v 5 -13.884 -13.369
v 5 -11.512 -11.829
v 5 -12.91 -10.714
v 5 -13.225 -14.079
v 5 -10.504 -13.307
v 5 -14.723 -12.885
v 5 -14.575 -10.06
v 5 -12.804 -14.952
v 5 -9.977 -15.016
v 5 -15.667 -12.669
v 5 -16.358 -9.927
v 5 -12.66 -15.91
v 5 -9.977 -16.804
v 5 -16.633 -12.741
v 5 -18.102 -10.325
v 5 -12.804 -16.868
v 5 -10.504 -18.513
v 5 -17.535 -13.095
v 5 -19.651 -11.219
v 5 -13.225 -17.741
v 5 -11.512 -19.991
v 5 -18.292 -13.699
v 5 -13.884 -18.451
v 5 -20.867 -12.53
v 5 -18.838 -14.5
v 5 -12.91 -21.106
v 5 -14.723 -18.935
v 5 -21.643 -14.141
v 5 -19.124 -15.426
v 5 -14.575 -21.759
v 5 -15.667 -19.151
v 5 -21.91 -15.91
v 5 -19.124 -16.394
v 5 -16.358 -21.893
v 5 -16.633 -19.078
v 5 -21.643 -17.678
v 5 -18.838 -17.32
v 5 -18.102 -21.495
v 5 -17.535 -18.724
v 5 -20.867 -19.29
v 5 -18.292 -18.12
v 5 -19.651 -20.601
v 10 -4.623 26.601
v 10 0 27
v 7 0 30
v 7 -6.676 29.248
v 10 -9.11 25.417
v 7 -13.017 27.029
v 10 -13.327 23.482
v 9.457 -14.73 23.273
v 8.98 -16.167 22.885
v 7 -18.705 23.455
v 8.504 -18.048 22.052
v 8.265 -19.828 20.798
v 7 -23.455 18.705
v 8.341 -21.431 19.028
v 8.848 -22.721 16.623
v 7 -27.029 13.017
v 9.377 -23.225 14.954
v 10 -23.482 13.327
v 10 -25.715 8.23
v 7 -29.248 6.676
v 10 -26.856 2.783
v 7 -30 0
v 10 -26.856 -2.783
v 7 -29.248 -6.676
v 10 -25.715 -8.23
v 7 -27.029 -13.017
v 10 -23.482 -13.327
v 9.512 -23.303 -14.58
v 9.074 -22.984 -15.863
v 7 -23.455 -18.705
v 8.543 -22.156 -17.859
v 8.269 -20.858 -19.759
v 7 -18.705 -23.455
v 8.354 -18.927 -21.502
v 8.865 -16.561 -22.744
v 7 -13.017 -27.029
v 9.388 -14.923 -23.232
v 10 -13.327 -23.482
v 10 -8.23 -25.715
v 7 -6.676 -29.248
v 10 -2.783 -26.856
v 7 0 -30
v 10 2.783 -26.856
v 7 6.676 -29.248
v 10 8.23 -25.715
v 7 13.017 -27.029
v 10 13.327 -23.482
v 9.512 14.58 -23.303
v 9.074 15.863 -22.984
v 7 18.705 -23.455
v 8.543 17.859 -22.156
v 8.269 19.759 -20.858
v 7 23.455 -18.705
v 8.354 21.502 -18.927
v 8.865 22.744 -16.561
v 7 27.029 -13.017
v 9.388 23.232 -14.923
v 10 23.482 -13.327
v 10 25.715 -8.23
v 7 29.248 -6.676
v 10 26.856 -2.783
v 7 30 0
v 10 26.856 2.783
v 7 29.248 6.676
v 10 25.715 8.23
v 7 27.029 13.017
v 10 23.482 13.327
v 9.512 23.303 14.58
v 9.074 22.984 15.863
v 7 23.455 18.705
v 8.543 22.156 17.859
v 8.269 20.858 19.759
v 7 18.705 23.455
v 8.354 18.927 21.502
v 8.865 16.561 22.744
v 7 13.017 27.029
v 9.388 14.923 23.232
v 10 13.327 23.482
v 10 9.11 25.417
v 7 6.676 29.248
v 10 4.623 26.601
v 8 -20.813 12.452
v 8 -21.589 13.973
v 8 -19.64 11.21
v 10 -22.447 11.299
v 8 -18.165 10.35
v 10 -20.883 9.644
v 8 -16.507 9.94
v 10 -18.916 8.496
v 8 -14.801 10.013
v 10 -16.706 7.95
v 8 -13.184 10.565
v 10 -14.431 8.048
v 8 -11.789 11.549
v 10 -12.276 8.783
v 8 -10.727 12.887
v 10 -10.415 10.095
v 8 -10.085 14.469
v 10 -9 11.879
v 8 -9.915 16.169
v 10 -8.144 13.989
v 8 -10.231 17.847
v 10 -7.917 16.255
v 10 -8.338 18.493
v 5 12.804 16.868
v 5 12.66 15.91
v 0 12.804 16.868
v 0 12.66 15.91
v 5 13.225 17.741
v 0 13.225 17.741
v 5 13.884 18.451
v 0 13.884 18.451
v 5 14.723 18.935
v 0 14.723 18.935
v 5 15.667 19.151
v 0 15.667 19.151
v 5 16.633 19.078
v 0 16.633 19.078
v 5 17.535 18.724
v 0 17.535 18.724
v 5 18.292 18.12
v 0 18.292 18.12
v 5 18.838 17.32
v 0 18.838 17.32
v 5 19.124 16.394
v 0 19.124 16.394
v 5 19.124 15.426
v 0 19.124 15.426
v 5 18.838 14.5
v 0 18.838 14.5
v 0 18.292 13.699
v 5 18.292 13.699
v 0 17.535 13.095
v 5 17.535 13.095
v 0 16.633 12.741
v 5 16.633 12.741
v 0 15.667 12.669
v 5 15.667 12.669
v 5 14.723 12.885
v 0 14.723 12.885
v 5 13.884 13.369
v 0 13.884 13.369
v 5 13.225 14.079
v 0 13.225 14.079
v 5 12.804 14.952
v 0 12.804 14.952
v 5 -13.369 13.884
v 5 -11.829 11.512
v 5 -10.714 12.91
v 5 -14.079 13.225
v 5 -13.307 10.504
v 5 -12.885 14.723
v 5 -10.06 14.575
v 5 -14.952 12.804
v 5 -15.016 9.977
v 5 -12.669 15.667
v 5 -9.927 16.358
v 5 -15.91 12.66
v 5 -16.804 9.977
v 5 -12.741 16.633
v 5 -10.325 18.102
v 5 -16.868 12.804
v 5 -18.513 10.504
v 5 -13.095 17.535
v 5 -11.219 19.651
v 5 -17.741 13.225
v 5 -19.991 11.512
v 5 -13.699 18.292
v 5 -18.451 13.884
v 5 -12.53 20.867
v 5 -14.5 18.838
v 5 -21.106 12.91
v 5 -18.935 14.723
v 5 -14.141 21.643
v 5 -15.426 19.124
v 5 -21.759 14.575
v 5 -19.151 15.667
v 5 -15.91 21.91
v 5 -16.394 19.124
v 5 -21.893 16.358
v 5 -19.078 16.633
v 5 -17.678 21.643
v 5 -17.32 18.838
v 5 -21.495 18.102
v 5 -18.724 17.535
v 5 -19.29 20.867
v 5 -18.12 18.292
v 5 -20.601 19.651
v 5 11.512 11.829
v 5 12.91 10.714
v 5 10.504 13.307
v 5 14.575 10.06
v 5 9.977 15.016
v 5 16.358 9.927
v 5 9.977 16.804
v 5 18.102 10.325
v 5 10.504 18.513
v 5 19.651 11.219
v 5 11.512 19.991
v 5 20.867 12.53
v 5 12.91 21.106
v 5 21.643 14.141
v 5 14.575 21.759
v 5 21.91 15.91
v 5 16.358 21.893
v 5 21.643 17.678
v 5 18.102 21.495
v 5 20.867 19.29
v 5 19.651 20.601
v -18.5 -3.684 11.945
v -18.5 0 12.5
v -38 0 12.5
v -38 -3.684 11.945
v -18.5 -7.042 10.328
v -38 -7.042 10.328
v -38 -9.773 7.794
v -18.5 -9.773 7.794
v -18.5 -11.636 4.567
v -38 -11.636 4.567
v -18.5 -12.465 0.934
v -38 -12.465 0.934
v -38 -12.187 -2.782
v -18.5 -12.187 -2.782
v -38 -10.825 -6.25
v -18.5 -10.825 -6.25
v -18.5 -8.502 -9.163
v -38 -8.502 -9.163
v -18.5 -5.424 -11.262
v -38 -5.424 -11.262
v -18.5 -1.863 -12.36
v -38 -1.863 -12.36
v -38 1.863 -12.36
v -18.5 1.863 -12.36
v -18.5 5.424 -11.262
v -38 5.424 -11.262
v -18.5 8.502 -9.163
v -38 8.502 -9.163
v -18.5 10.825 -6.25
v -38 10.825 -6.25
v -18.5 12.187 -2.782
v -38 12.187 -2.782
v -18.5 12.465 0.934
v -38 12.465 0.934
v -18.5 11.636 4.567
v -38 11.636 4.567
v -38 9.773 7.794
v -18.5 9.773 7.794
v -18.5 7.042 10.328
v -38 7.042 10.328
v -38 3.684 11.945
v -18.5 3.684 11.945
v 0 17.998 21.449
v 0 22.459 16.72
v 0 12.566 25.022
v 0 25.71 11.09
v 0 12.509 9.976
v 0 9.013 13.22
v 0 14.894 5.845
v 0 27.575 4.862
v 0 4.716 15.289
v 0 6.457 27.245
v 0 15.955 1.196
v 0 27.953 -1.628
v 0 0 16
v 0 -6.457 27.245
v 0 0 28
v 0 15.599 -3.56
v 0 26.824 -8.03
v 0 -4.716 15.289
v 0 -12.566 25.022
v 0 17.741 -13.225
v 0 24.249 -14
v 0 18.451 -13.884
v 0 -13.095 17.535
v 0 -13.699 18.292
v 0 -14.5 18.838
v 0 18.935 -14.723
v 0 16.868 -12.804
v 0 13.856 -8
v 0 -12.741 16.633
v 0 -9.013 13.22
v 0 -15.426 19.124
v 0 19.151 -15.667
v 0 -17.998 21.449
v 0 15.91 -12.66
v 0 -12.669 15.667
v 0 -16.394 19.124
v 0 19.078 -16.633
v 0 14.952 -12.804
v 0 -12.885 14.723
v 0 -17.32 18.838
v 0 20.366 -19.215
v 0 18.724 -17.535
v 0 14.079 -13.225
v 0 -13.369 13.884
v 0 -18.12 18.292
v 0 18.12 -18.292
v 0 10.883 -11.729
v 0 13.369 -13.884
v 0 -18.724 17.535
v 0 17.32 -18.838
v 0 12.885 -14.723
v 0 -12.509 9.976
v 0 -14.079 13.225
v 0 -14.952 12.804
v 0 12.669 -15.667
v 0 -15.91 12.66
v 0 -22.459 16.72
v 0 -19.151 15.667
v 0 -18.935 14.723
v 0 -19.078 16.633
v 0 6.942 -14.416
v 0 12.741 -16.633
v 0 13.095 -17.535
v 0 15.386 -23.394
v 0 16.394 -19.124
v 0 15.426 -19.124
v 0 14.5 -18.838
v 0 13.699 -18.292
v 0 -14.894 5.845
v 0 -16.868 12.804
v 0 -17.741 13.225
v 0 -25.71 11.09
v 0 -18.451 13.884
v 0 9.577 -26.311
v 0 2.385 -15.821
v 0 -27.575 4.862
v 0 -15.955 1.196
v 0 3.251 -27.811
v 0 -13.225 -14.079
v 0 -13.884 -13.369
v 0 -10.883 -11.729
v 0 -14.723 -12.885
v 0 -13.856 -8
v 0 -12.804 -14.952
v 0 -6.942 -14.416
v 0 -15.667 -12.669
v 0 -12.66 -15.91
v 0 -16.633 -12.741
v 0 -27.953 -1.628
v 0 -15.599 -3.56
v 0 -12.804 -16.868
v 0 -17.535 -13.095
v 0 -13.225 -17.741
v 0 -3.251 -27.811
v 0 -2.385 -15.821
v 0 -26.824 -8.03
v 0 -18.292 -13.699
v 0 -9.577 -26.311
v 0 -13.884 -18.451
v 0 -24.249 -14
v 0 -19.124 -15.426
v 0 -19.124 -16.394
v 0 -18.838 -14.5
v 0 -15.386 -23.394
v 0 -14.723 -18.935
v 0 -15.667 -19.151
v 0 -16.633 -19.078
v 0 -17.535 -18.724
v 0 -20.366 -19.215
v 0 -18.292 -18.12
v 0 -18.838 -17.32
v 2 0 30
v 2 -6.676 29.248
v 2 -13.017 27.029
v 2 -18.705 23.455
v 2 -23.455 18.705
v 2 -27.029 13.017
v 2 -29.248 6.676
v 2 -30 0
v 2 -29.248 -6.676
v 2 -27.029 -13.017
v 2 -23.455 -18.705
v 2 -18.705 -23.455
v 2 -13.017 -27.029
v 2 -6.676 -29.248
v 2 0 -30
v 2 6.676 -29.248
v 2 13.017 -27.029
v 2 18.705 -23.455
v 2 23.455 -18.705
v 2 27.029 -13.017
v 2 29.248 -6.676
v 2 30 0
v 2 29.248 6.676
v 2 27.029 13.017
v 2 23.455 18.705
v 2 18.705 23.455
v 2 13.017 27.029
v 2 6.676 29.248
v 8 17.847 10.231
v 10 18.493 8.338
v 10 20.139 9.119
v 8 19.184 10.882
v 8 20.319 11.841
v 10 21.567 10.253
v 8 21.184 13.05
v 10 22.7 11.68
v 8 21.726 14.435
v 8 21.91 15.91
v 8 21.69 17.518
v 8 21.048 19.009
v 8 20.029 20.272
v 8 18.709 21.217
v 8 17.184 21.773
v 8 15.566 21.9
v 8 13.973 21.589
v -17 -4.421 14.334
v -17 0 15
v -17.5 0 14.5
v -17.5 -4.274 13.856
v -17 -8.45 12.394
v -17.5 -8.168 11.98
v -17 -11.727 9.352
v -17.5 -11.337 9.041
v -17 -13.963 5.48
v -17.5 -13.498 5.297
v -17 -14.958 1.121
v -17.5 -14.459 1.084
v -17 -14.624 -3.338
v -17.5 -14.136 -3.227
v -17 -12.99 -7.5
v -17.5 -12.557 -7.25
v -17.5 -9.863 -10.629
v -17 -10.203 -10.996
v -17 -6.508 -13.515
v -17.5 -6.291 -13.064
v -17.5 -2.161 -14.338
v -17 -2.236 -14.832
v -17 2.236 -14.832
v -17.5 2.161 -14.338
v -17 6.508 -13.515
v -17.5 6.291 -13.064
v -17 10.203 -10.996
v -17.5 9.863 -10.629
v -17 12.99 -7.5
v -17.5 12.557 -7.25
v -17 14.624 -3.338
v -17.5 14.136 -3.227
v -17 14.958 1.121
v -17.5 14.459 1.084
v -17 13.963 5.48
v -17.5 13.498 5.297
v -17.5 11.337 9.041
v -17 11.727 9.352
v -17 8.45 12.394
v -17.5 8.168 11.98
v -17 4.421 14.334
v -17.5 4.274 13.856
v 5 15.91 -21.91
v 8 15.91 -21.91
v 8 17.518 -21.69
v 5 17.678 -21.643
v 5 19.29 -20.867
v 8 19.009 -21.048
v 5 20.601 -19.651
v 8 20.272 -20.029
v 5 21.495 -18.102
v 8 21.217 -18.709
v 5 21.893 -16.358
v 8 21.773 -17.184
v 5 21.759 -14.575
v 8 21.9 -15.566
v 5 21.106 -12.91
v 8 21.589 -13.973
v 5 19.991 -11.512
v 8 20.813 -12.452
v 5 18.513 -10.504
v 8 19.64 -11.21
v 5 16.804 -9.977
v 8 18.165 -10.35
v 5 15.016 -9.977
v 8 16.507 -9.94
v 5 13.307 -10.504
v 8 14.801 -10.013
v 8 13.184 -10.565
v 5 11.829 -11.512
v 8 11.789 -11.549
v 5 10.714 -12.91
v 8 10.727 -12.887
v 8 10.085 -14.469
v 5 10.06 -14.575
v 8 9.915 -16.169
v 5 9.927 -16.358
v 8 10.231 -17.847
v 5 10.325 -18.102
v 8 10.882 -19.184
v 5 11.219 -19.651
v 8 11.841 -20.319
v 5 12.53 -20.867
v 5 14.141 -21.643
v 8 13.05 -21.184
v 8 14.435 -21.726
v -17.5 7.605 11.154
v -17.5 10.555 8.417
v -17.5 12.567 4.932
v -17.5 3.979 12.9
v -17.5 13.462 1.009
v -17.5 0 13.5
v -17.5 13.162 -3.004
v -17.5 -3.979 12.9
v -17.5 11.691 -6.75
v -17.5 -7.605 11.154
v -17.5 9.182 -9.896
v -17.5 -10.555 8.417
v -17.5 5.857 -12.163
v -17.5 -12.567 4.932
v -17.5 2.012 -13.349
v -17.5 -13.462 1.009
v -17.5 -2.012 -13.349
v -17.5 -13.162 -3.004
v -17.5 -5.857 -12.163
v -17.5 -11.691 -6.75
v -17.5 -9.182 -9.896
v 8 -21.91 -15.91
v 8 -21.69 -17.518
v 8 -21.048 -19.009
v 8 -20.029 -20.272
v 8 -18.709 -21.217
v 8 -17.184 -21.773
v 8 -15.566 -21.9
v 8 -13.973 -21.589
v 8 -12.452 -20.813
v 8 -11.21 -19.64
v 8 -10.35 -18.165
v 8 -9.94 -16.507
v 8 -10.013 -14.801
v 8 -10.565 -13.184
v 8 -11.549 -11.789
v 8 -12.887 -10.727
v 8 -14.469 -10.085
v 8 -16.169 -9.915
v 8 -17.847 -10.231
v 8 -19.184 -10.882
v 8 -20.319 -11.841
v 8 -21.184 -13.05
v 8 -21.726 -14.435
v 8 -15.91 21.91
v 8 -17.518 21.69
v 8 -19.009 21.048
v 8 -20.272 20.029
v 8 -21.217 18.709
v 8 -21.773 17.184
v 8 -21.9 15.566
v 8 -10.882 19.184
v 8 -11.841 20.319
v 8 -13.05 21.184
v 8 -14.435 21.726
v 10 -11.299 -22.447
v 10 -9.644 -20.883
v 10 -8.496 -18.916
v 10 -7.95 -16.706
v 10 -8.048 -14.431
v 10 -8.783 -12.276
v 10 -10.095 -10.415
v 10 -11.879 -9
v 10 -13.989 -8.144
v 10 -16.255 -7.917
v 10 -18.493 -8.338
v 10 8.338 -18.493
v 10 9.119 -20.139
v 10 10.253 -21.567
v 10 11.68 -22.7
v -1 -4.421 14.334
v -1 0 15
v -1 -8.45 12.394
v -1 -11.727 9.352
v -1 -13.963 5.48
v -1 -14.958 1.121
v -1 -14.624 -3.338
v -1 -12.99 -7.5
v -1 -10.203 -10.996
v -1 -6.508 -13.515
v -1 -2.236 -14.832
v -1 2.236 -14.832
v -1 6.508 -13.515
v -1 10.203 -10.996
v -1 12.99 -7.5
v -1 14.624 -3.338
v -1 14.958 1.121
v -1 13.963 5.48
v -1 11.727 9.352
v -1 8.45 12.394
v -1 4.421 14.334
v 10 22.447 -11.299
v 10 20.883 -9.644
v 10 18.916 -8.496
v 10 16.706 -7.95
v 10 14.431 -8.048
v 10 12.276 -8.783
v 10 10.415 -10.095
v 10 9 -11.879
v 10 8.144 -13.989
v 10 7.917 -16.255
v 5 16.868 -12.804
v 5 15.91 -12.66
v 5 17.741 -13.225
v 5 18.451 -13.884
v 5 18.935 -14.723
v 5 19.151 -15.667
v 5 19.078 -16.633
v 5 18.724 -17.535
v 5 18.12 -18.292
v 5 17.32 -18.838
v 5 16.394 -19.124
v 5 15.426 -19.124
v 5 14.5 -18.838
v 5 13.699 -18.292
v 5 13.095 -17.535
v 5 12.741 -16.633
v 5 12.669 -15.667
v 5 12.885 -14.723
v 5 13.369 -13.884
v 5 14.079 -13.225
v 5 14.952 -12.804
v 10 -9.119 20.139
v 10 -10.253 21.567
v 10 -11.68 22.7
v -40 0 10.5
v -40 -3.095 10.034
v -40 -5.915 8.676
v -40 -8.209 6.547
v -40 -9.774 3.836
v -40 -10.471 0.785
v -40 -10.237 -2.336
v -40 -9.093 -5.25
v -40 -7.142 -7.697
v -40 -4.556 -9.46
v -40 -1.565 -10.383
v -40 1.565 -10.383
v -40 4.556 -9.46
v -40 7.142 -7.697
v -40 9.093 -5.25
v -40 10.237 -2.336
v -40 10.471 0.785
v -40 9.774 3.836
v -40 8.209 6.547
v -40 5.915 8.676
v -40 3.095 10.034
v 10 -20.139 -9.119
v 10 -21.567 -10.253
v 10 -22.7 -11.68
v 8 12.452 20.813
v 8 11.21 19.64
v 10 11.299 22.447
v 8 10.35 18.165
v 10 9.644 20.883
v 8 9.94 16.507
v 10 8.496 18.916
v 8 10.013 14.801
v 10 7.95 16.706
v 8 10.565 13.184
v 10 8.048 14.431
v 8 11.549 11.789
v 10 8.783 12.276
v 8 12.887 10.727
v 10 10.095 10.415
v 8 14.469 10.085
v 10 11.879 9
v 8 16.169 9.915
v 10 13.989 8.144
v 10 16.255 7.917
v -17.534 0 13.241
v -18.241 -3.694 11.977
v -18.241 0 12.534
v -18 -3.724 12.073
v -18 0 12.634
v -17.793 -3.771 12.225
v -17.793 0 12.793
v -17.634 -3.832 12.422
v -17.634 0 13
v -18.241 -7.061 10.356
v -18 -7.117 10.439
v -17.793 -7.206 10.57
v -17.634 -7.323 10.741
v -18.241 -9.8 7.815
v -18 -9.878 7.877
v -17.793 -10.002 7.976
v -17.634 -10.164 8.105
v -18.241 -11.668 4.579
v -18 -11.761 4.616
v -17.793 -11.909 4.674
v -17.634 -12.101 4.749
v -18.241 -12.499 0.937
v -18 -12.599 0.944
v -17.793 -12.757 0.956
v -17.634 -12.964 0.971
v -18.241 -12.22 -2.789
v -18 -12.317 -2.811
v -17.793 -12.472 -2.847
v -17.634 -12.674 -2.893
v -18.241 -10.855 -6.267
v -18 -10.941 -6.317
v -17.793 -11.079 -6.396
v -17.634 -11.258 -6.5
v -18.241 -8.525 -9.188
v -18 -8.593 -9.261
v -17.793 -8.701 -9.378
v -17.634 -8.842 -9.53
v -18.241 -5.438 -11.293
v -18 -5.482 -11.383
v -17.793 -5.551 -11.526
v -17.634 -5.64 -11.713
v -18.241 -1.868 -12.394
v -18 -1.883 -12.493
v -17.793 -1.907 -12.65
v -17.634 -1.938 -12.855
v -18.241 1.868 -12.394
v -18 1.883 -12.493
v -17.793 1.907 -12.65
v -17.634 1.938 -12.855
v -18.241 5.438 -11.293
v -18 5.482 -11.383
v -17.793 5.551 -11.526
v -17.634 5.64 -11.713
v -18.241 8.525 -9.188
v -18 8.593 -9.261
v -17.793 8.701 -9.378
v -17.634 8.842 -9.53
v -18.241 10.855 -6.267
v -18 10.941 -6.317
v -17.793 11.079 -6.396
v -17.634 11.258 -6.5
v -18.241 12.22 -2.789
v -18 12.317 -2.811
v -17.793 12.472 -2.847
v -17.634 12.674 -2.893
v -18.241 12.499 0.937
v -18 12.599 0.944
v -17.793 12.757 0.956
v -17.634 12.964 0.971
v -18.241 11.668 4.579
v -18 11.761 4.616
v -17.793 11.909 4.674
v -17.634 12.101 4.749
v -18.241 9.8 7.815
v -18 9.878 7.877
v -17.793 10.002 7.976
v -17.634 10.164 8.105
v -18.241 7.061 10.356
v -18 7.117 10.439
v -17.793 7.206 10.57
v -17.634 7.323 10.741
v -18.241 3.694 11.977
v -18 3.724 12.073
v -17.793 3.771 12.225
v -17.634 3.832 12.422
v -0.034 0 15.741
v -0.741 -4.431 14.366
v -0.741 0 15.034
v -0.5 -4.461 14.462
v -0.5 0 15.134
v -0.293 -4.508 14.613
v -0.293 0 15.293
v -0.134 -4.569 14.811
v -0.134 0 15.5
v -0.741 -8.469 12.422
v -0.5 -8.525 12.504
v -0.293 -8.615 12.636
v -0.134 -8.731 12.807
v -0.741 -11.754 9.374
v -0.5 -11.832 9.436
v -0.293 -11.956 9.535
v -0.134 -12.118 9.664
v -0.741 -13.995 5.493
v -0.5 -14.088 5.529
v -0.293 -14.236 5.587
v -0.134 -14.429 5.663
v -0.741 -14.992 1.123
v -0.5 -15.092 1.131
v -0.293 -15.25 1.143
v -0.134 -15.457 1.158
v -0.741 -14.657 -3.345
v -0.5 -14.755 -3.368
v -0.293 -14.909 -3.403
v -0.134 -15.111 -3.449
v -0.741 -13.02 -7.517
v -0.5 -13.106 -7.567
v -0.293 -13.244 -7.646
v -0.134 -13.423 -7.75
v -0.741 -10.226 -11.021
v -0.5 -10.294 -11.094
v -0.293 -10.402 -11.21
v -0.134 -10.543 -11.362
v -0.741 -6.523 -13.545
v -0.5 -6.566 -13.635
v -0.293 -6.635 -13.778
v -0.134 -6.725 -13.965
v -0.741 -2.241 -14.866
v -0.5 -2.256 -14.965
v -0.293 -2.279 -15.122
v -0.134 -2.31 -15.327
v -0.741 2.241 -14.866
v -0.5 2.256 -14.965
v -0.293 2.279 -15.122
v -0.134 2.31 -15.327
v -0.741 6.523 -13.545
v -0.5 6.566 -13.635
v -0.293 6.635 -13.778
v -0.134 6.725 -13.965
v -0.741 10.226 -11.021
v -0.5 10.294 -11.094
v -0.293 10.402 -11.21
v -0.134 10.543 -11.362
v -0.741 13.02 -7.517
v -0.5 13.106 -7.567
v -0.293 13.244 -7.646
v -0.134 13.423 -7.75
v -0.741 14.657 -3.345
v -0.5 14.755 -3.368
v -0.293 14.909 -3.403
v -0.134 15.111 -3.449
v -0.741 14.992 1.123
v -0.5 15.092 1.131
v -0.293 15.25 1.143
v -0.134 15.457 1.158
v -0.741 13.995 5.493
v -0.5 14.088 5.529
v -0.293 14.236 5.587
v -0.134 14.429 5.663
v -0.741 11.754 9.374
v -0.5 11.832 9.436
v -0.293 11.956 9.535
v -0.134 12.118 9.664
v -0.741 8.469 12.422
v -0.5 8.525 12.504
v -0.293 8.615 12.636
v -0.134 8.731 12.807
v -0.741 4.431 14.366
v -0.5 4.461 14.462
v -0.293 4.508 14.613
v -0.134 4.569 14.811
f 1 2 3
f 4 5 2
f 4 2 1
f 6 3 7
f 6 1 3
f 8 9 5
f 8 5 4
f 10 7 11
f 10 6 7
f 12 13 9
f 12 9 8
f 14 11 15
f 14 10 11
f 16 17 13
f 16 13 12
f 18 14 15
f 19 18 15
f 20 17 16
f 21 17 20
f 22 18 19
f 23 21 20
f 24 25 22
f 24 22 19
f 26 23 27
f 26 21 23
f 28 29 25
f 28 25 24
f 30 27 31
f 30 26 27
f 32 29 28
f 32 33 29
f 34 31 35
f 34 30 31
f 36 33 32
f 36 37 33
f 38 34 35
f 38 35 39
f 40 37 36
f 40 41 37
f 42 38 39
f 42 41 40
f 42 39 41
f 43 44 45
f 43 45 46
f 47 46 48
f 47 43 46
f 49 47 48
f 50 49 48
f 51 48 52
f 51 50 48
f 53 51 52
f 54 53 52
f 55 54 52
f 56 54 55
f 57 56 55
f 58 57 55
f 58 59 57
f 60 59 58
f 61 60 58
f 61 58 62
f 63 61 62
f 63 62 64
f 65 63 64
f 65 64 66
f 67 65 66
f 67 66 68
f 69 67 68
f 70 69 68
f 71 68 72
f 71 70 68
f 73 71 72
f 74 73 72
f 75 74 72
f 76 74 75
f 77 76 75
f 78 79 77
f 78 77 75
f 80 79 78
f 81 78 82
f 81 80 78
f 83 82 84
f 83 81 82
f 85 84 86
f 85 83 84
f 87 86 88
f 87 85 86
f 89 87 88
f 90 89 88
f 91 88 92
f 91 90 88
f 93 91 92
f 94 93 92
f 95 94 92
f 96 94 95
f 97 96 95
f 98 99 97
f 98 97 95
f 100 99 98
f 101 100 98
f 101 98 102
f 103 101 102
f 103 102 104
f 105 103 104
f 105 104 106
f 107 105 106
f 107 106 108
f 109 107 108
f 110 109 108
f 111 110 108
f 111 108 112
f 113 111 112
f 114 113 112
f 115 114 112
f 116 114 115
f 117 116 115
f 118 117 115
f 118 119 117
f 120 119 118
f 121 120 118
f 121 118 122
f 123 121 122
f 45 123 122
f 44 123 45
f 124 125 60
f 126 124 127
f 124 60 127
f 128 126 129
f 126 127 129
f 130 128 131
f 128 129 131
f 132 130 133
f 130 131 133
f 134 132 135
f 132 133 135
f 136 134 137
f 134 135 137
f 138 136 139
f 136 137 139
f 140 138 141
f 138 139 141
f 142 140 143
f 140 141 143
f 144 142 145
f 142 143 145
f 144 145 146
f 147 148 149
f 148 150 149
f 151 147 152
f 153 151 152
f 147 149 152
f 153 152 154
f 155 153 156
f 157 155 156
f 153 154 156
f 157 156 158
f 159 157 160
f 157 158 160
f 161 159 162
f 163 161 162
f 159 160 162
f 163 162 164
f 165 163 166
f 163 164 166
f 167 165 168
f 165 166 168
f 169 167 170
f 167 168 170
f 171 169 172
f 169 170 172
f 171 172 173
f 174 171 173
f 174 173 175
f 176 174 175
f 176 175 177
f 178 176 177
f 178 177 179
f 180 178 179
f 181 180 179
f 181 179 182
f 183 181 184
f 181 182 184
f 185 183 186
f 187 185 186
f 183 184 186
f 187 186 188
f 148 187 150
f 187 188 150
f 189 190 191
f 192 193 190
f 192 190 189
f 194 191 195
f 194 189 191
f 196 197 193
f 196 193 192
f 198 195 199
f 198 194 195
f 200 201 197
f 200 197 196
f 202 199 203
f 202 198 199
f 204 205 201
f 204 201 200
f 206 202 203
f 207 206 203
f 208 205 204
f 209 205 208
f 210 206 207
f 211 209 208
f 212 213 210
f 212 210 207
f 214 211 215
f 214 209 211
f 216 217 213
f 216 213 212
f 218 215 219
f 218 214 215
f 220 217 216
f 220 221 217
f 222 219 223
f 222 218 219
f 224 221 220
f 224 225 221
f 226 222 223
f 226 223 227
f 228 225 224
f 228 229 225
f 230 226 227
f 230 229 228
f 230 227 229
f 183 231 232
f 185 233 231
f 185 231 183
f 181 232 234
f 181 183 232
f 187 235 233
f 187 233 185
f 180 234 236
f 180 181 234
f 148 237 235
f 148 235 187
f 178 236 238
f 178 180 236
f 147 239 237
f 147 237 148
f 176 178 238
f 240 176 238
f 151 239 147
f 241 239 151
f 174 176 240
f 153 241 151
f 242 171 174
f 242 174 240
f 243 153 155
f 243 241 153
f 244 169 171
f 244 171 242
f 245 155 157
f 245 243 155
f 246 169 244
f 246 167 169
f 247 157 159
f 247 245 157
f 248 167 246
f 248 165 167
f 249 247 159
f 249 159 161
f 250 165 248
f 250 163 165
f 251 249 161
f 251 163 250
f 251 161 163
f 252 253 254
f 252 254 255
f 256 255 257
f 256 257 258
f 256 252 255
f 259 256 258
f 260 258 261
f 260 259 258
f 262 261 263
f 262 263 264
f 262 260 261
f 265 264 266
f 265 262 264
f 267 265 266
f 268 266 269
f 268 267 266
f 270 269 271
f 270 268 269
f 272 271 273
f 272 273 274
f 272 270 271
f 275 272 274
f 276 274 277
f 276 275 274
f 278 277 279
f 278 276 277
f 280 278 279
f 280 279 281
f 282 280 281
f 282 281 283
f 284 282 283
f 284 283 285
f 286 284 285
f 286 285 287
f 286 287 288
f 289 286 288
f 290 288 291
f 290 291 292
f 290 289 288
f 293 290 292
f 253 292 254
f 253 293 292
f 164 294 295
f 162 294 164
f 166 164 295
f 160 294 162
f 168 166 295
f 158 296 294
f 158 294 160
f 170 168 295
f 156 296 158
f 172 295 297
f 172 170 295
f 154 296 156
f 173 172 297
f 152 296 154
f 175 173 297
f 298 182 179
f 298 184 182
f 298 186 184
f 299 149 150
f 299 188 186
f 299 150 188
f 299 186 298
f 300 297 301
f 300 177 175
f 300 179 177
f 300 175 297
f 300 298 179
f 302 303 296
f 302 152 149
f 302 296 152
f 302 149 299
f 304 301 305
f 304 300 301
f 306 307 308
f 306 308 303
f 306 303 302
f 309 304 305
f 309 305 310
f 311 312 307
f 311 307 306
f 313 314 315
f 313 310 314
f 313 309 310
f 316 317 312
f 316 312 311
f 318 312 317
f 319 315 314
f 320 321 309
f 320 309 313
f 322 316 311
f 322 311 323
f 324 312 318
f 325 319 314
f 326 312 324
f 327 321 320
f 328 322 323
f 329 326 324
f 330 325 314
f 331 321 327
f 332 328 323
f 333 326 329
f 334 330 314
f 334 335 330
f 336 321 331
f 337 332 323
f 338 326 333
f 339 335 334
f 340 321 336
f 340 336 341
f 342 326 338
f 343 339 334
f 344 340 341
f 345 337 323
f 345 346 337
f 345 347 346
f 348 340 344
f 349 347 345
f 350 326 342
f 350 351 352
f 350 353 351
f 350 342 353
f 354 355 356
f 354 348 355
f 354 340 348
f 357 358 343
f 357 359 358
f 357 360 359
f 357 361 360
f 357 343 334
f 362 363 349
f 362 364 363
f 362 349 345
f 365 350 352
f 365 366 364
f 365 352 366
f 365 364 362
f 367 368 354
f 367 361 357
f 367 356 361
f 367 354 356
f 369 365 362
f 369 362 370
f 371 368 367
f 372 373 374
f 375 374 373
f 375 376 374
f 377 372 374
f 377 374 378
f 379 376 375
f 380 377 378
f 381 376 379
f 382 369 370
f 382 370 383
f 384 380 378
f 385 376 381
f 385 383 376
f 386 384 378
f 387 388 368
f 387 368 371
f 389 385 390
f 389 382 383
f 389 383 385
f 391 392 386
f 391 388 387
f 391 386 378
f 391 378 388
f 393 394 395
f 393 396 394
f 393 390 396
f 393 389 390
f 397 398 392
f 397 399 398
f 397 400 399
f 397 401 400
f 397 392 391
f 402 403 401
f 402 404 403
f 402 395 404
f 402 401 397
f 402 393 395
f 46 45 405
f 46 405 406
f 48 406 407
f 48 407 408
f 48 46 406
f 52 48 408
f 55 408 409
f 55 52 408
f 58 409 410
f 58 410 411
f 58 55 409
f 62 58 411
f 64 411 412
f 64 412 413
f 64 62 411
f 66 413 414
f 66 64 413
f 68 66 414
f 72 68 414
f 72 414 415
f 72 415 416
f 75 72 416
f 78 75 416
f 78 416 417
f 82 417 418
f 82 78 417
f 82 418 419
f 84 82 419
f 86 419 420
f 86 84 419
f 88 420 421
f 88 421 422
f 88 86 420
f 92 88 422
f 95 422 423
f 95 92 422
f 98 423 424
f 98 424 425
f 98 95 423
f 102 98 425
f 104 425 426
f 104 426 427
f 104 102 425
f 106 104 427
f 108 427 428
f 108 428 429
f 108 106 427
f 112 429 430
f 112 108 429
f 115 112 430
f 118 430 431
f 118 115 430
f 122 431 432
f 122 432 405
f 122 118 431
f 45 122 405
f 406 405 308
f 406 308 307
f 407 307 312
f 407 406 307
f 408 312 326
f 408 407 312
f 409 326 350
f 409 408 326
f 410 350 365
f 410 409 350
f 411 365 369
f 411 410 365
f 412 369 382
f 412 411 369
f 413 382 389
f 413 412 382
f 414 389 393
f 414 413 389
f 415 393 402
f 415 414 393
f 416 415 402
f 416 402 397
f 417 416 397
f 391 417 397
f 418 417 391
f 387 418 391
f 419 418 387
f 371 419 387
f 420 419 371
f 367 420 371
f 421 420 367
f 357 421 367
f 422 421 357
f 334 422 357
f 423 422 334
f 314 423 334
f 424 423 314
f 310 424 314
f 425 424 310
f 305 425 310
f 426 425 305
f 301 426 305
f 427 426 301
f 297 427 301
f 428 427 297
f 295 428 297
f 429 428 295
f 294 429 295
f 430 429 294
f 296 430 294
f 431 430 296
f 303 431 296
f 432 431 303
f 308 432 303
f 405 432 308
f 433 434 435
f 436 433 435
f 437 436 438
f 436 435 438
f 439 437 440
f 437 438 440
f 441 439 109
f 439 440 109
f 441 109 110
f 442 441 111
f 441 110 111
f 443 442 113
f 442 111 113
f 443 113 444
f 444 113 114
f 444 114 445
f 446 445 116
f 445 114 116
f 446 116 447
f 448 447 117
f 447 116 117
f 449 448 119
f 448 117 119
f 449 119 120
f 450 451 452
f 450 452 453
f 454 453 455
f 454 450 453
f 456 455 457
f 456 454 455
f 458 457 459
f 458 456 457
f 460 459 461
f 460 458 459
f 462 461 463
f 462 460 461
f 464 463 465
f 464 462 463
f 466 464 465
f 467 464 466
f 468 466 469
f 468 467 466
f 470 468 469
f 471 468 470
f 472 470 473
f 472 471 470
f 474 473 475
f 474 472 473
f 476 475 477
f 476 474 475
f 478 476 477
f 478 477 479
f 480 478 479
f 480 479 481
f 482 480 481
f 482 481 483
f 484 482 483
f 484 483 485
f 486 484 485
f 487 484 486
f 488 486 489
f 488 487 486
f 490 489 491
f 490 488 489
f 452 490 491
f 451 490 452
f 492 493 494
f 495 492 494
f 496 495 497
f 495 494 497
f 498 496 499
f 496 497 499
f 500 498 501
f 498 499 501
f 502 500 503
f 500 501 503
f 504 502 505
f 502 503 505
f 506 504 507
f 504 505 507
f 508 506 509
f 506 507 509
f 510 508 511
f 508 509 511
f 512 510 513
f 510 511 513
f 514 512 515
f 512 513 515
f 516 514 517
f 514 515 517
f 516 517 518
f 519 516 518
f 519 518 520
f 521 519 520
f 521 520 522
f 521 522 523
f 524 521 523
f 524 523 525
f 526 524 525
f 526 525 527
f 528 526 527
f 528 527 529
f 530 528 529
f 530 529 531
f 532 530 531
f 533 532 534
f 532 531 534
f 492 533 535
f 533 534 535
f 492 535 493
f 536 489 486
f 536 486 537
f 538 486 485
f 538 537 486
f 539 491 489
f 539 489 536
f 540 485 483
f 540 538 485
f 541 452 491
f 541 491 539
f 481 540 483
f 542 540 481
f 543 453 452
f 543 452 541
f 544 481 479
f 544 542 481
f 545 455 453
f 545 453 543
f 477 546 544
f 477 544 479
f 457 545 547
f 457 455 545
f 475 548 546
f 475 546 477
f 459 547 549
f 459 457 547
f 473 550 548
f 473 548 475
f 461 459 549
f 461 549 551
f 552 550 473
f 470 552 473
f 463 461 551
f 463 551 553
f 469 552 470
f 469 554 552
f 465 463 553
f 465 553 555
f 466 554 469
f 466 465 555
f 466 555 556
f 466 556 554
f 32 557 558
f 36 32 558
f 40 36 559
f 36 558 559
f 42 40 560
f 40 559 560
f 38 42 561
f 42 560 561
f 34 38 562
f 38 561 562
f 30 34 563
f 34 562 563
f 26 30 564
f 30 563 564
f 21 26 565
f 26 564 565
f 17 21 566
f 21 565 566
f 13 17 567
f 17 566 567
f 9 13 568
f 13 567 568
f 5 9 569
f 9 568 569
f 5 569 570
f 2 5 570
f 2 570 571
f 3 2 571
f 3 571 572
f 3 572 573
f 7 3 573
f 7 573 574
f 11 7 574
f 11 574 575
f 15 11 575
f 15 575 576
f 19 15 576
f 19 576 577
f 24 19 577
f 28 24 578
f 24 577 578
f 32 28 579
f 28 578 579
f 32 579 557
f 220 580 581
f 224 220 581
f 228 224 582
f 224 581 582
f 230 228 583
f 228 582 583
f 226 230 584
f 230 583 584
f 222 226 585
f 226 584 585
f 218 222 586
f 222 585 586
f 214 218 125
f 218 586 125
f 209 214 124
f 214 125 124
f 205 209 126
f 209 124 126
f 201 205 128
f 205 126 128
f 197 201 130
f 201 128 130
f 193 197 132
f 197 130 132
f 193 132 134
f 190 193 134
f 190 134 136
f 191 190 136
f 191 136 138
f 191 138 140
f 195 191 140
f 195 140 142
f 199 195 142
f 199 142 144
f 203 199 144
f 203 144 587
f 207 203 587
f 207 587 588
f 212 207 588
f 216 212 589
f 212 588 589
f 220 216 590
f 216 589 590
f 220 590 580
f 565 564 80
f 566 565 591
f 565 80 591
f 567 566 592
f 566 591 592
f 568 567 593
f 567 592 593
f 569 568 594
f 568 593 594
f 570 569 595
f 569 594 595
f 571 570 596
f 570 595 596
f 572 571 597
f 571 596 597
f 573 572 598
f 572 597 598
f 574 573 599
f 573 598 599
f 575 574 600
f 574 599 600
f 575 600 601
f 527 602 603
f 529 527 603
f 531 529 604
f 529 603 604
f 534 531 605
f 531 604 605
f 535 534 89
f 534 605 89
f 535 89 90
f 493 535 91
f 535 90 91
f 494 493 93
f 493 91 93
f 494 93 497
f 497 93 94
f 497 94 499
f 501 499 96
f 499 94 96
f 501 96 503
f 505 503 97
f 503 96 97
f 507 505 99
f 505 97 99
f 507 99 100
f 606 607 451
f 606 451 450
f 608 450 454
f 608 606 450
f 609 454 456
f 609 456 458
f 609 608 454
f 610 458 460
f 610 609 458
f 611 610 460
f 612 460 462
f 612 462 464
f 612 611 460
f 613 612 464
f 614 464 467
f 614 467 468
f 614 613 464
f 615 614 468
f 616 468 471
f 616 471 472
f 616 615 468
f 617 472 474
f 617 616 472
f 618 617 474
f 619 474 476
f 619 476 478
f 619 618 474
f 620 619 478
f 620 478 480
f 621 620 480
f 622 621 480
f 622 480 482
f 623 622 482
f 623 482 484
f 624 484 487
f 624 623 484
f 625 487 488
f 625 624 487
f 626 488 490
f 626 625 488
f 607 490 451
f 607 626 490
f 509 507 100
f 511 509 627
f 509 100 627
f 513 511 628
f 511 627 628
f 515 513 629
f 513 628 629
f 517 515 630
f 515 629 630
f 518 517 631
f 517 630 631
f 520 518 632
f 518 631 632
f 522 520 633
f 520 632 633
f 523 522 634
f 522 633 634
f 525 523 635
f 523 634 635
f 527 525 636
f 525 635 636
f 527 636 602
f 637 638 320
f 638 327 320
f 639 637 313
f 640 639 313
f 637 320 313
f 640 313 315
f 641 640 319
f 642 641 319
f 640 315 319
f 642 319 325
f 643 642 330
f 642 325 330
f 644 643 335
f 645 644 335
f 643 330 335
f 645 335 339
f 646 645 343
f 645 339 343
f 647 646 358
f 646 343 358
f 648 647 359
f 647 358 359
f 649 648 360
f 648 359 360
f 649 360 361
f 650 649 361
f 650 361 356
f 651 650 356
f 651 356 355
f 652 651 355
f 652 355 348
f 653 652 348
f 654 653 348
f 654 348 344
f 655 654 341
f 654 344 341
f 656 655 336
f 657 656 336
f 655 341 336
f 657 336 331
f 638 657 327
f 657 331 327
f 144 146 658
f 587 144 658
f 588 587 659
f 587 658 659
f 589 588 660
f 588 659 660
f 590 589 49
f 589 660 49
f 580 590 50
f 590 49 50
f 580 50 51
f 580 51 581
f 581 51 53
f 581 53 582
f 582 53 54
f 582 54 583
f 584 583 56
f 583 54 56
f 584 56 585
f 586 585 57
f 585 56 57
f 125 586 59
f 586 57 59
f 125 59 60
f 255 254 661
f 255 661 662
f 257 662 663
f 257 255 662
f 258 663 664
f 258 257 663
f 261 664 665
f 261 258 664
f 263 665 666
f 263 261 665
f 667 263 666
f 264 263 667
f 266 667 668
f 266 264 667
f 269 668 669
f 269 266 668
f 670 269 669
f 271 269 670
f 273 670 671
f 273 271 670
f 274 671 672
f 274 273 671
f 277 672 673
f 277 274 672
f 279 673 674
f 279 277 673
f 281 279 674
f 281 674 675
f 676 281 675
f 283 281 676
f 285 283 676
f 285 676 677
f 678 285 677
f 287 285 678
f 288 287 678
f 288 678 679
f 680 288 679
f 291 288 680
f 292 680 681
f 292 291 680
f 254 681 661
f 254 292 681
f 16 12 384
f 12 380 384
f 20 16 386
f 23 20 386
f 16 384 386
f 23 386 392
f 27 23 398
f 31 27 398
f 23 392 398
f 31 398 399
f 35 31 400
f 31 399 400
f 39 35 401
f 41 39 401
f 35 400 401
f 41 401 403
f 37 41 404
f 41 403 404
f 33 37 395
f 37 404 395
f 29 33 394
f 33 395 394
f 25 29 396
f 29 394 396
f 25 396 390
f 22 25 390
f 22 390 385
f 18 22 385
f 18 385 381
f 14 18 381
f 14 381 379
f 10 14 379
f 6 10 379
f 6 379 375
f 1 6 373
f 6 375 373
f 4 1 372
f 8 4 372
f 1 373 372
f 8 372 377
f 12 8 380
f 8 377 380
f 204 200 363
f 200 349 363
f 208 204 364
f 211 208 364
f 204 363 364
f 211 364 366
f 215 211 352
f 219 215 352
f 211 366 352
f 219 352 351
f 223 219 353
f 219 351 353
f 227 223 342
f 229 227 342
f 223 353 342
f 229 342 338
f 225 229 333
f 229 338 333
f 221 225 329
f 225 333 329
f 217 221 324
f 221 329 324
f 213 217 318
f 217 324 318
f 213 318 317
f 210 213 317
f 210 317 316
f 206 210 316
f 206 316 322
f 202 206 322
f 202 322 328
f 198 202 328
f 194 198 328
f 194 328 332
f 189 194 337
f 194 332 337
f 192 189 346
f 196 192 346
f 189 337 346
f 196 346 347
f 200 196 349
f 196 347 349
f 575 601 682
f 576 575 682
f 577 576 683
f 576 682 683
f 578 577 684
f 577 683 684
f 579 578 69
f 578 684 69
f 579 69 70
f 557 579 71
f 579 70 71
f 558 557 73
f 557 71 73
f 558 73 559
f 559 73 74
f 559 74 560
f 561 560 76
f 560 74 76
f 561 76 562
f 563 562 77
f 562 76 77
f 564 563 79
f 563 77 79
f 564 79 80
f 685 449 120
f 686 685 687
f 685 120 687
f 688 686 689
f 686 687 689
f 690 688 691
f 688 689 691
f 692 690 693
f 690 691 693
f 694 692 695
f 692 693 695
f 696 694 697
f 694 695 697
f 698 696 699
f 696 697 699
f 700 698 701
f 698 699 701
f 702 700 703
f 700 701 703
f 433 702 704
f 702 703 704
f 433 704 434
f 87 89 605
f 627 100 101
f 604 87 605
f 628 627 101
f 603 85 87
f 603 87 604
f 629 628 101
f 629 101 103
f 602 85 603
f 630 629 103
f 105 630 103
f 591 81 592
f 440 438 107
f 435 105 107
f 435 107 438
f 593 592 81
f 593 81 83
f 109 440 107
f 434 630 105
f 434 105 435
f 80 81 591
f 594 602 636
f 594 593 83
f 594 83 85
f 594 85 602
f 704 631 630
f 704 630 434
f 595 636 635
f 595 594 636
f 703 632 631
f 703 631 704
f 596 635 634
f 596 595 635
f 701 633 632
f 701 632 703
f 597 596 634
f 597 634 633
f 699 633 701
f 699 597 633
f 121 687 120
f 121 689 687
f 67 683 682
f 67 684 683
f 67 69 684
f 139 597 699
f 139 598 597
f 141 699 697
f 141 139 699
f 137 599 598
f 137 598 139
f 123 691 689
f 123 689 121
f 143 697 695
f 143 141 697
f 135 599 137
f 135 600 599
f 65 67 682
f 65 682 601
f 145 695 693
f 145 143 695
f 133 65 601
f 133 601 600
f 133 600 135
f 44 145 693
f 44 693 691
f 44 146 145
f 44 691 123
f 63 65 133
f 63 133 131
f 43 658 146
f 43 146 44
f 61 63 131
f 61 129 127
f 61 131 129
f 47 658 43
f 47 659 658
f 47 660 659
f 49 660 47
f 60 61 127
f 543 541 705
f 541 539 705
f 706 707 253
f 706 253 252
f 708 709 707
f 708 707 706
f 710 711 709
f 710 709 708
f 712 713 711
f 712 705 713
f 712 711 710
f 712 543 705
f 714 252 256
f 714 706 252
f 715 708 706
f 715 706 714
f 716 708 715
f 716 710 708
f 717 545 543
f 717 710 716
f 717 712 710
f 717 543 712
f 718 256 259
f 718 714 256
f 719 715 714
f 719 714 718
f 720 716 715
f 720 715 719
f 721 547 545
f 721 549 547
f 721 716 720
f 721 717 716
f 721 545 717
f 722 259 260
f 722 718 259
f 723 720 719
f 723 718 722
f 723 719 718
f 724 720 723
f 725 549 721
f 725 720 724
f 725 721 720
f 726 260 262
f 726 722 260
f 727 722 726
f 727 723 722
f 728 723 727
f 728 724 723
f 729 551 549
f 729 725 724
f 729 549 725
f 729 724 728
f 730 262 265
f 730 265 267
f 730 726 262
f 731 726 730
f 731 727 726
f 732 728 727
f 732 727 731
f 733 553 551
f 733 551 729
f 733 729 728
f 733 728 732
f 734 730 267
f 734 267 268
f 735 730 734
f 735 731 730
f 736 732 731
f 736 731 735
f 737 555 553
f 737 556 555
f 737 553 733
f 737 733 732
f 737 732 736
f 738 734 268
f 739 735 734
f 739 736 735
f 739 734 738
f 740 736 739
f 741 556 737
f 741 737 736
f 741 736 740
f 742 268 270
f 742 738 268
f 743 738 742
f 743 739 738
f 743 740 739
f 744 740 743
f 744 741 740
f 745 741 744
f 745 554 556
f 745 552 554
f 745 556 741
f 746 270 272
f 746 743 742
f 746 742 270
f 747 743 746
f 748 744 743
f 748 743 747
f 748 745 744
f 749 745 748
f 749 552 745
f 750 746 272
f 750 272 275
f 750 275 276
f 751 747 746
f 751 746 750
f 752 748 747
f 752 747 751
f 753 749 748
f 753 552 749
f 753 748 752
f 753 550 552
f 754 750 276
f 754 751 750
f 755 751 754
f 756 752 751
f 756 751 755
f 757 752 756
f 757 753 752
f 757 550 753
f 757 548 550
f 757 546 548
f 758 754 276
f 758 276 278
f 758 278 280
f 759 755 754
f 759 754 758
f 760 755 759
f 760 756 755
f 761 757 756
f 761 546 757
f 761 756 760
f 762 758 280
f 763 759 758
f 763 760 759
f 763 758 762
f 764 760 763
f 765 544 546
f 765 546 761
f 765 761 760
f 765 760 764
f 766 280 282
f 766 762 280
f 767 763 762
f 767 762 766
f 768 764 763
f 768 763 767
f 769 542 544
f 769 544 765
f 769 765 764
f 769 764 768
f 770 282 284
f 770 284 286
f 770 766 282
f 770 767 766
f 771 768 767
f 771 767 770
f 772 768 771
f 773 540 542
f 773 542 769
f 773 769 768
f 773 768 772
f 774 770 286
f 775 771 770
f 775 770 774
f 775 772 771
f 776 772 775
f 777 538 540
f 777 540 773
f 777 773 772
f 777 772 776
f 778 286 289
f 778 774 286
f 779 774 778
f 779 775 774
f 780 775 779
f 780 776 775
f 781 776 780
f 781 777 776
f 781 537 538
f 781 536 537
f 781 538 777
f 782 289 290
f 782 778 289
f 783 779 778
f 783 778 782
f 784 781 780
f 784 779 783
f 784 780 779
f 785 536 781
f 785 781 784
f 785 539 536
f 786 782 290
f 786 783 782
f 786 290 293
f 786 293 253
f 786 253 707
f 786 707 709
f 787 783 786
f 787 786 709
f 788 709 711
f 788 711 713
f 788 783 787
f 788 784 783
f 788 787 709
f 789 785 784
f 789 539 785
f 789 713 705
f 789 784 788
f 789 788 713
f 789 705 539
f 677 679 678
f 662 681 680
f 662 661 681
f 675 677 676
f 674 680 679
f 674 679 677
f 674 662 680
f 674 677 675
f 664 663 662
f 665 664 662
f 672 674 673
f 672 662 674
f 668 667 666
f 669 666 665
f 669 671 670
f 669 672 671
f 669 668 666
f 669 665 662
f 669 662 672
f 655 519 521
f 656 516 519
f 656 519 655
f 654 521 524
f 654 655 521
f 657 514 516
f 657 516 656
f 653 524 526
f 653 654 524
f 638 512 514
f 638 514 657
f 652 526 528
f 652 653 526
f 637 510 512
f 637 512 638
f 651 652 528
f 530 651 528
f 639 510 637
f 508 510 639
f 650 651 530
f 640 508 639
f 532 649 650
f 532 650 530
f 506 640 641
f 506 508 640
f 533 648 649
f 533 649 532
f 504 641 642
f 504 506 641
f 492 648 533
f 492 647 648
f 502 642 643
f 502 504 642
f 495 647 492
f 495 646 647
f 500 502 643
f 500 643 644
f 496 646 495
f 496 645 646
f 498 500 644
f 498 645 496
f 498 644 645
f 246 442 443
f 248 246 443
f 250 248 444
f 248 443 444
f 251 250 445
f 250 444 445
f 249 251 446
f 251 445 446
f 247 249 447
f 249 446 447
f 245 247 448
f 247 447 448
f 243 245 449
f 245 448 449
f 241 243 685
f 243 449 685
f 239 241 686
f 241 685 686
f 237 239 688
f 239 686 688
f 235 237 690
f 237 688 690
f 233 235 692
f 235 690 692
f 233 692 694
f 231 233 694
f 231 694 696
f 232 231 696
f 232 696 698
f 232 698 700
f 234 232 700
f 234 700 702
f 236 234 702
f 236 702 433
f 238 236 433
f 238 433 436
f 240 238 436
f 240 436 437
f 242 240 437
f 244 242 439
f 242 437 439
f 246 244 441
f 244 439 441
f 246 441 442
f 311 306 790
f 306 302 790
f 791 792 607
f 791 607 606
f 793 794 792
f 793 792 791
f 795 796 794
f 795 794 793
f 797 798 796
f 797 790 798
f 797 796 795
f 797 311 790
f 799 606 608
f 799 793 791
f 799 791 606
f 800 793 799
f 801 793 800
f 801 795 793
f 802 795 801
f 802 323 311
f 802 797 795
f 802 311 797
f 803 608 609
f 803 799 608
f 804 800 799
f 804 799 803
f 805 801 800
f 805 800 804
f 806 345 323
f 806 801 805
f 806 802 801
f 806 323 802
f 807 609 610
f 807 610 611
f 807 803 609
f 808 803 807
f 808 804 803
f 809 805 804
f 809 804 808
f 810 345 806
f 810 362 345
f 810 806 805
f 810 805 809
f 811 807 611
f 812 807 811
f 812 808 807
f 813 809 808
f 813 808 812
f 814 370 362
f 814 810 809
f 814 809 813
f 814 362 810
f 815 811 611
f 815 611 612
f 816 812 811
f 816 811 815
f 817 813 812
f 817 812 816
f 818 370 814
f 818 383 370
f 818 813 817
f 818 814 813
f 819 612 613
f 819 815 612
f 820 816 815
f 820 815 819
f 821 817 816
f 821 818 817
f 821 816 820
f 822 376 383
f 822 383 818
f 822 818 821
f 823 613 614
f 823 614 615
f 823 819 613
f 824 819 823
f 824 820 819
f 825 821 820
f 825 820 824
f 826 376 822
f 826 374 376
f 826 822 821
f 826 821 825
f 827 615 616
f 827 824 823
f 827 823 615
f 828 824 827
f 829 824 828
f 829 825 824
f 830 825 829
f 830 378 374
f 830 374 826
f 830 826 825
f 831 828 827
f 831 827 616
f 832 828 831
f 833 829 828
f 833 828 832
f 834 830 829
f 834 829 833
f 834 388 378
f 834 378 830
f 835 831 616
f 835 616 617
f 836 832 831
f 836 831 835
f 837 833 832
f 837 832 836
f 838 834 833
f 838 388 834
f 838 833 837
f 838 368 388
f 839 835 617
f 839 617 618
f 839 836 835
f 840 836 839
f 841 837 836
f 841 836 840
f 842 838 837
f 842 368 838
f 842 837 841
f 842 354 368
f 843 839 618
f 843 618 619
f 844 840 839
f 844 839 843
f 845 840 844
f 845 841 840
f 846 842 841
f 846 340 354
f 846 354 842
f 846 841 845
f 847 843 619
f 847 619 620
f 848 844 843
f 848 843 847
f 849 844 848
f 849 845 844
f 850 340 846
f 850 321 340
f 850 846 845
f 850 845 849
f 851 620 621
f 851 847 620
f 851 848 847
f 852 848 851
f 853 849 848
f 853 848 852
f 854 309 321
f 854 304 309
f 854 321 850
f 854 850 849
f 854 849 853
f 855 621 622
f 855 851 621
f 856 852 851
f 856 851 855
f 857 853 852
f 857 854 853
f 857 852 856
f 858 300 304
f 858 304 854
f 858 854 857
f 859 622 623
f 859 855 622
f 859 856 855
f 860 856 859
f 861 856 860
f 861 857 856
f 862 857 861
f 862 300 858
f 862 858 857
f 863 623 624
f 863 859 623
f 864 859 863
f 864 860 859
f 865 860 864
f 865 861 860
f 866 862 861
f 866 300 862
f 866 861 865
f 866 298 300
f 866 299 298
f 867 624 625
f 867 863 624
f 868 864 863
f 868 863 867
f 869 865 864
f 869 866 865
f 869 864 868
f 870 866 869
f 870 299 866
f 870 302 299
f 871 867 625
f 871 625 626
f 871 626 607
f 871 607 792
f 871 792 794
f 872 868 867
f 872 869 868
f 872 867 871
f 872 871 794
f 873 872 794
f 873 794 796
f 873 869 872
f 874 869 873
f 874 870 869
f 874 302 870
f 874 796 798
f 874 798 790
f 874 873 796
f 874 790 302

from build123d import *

# Parameters (mm, degrees)
CHAMFER1_SIZE     = 2
FILLET1_R         = 1
CHAMFER2_SIZE     = 0.5
FILLET2_R         = 1
CHAMFER3_SIZE     = 2
CHAMFER4_SIZE     = 3
HOLE1_D           = 6.5
HOLE1_CBORE_D     = 12
HOLE1_CBORE_DEPTH = 5
CIRPATTERN1_COUNT = 4


with BuildPart() as part:
    # Sketch1 → Revolve1 (revolve)
    with BuildSketch(Plane.XY, mode=Mode.PRIVATE) as revolve1_sk:
        Polygon((-40, 0), (-40, 12.5), (-17.5, 12.5), (-17.5, 15), (0, 15), (0, 30), (10, 30), (10, 0), align=None)
    revolve(revolve1_sk.sketch.rotate(Axis((-40, 0, 0), (1, 0, 0)), 90), axis=Axis((-40, 0, 0), (1, 0, 0)))

    # Chamfer1
    chamfer1_edges = [part.edges().sort_by_distance(p)[0] for p in [
        (-40, 0, -12.5),
    ]]
    chamfer(chamfer1_edges, length=CHAMFER1_SIZE)

    # Fillet1
    fillet1_edges = [part.edges().sort_by_distance(p)[0] for p in [
        (-17.5, 0, -12.5),
    ]]
    fillet(fillet1_edges, radius=FILLET1_R)

    # Chamfer2
    chamfer2_edges = [part.edges().sort_by_distance(p)[0] for p in [
        (-17.5, 0, -15),
    ]]
    chamfer(chamfer2_edges, length=CHAMFER2_SIZE)

    # Fillet2
    fillet2_edges = [part.edges().sort_by_distance(p)[0] for p in [
        (0, 0, -15),
    ]]
    fillet(fillet2_edges, radius=FILLET2_R)

    # Chamfer3
    chamfer3_edges = [part.edges().sort_by_distance(p)[0] for p in [
        (0, 0, -30),
    ]]
    chamfer(chamfer3_edges, length=CHAMFER3_SIZE)

    # Chamfer4
    chamfer4_edges = [part.edges().sort_by_distance(p)[0] for p in [
        (10, 0, -30),
    ]]
    chamfer(chamfer4_edges, length=CHAMFER4_SIZE)

    # Hole1 (through all)
    with Locations(Plane(origin=(10, 0, 0), x_dir=(0, 0, -1), z_dir=(1, 0, 0))):
        with Locations((15.909902577, 15.909902577)):
            hole1 = CounterBoreHole(HOLE1_D / 2, HOLE1_CBORE_D / 2, HOLE1_CBORE_DEPTH)

    # CirPattern1: Hole1 ×4 about axis
    cirpattern1_axis = Axis((0, 0, 0), (1, 0, 0))
    for i in range(1, CIRPATTERN1_COUNT):
        add(hole1.rotate(cirpattern1_axis, i * 360 / CIRPATTERN1_COUNT), mode=Mode.SUBTRACT)

    # Chamfer5: read off the stored shape, not the designer's step
    # Chamfer5: loft between two sections, ruled curve by curve
    chamfer5_from = [
        Edge.make_three_point_arc((8, -21.588647326, 13.972931211), (8, -13.972931211, 10.231157827), (8, -10.231157827, 17.846873942)),
        Edge.make_three_point_arc((8, -10.231157827, 17.846873942), (8, -17.846873942, 21.588647326), (8, -21.588647326, 13.972931211)),
    ]
    chamfer5_to = [
        Edge.make_three_point_arc((10.000000095, -23.481562332, 13.327274059), (10.000000095, -13.327274059, 8.338242821), (10.000000095, -8.338242821, 18.492531095)),
        Edge.make_three_point_arc((10.000000095, -8.338242821, 18.492531095), (10.000000095, -18.492531095, 23.481562332), (10.000000095, -23.481562332, 13.327274059)),
    ]
    chamfer5 = Solid(Shell([*[Face.make_surface_from_curves(chamfer5_from[k], chamfer5_to[k]) for k in range(2)], Face(Wire(chamfer5_from)), Face(Wire(chamfer5_to))]))
    add(chamfer5, mode=Mode.SUBTRACT)

    # Chamfer5 2: loft between two sections, ruled curve by curve
    chamfer5_2_from = [
        Edge.make_three_point_arc((8, -13.972931211, -21.588647326), (8, -10.231157827, -13.972931211), (8, -17.846873942, -10.231157827)),
        Edge.make_three_point_arc((8, -17.846873942, -10.231157827), (8, -21.588647326, -17.846873942), (8, -13.972931211, -21.588647326)),
    ]
    chamfer5_2_to = [
        Edge.make_three_point_arc((10.000000095, -13.327274059, -23.481562332), (10.000000095, -8.338242821, -13.327274059), (10.000000095, -18.492531095, -8.338242821)),
        Edge.make_three_point_arc((10.000000095, -18.492531095, -8.338242821), (10.000000095, -23.481562332, -18.492531095), (10.000000095, -13.327274059, -23.481562332)),
    ]
    chamfer5_2 = Solid(Shell([*[Face.make_surface_from_curves(chamfer5_2_from[k], chamfer5_2_to[k]) for k in range(2)], Face(Wire(chamfer5_2_from)), Face(Wire(chamfer5_2_to))]))
    add(chamfer5_2, mode=Mode.SUBTRACT)

    # Chamfer5 3: loft between two sections, ruled curve by curve
    chamfer5_3_from = [
        Edge.make_three_point_arc((8, 21.588647326, -13.972931211), (8, 13.972931211, -10.231157827), (8, 10.231157827, -17.846873942)),
        Edge.make_three_point_arc((8, 10.231157827, -17.846873942), (8, 17.846873942, -21.588647326), (8, 21.588647326, -13.972931211)),
    ]
    chamfer5_3_to = [
        Edge.make_three_point_arc((10.000000095, 23.481562332, -13.327274059), (10.000000095, 13.327274059, -8.338242821), (10.000000095, 8.338242821, -18.492531095)),
        Edge.make_three_point_arc((10.000000095, 8.338242821, -18.492531095), (10.000000095, 18.492531095, -23.481562332), (10.000000095, 23.481562332, -13.327274059)),
    ]
    chamfer5_3 = Solid(Shell([*[Face.make_surface_from_curves(chamfer5_3_from[k], chamfer5_3_to[k]) for k in range(2)], Face(Wire(chamfer5_3_from)), Face(Wire(chamfer5_3_to))]))
    add(chamfer5_3, mode=Mode.SUBTRACT)

    # Chamfer5 4: loft between two sections, ruled curve by curve
    chamfer5_4_from = [
        Edge.make_three_point_arc((8, 13.972931211, 21.588647326), (8, 10.231157827, 13.972931211), (8, 17.846873942, 10.231157827)),
        Edge.make_three_point_arc((8, 17.846873942, 10.231157827), (8, 21.588647326, 17.846873942), (8, 13.972931211, 21.588647326)),
    ]
    chamfer5_4_to = [
        Edge.make_three_point_arc((10.000000095, 13.327274059, 23.481562332), (10.000000095, 8.338242821, 13.327274059), (10.000000095, 18.492531095, 8.338242821)),
        Edge.make_three_point_arc((10.000000095, 18.492531095, 8.338242821), (10.000000095, 23.481562332, 18.492531095), (10.000000095, 13.327274059, 23.481562332)),
    ]
    chamfer5_4 = Solid(Shell([*[Face.make_surface_from_curves(chamfer5_4_from[k], chamfer5_4_to[k]) for k in range(2)], Face(Wire(chamfer5_4_from)), Face(Wire(chamfer5_4_to))]))
    add(chamfer5_4, mode=Mode.SUBTRACT)


solid = part.part
